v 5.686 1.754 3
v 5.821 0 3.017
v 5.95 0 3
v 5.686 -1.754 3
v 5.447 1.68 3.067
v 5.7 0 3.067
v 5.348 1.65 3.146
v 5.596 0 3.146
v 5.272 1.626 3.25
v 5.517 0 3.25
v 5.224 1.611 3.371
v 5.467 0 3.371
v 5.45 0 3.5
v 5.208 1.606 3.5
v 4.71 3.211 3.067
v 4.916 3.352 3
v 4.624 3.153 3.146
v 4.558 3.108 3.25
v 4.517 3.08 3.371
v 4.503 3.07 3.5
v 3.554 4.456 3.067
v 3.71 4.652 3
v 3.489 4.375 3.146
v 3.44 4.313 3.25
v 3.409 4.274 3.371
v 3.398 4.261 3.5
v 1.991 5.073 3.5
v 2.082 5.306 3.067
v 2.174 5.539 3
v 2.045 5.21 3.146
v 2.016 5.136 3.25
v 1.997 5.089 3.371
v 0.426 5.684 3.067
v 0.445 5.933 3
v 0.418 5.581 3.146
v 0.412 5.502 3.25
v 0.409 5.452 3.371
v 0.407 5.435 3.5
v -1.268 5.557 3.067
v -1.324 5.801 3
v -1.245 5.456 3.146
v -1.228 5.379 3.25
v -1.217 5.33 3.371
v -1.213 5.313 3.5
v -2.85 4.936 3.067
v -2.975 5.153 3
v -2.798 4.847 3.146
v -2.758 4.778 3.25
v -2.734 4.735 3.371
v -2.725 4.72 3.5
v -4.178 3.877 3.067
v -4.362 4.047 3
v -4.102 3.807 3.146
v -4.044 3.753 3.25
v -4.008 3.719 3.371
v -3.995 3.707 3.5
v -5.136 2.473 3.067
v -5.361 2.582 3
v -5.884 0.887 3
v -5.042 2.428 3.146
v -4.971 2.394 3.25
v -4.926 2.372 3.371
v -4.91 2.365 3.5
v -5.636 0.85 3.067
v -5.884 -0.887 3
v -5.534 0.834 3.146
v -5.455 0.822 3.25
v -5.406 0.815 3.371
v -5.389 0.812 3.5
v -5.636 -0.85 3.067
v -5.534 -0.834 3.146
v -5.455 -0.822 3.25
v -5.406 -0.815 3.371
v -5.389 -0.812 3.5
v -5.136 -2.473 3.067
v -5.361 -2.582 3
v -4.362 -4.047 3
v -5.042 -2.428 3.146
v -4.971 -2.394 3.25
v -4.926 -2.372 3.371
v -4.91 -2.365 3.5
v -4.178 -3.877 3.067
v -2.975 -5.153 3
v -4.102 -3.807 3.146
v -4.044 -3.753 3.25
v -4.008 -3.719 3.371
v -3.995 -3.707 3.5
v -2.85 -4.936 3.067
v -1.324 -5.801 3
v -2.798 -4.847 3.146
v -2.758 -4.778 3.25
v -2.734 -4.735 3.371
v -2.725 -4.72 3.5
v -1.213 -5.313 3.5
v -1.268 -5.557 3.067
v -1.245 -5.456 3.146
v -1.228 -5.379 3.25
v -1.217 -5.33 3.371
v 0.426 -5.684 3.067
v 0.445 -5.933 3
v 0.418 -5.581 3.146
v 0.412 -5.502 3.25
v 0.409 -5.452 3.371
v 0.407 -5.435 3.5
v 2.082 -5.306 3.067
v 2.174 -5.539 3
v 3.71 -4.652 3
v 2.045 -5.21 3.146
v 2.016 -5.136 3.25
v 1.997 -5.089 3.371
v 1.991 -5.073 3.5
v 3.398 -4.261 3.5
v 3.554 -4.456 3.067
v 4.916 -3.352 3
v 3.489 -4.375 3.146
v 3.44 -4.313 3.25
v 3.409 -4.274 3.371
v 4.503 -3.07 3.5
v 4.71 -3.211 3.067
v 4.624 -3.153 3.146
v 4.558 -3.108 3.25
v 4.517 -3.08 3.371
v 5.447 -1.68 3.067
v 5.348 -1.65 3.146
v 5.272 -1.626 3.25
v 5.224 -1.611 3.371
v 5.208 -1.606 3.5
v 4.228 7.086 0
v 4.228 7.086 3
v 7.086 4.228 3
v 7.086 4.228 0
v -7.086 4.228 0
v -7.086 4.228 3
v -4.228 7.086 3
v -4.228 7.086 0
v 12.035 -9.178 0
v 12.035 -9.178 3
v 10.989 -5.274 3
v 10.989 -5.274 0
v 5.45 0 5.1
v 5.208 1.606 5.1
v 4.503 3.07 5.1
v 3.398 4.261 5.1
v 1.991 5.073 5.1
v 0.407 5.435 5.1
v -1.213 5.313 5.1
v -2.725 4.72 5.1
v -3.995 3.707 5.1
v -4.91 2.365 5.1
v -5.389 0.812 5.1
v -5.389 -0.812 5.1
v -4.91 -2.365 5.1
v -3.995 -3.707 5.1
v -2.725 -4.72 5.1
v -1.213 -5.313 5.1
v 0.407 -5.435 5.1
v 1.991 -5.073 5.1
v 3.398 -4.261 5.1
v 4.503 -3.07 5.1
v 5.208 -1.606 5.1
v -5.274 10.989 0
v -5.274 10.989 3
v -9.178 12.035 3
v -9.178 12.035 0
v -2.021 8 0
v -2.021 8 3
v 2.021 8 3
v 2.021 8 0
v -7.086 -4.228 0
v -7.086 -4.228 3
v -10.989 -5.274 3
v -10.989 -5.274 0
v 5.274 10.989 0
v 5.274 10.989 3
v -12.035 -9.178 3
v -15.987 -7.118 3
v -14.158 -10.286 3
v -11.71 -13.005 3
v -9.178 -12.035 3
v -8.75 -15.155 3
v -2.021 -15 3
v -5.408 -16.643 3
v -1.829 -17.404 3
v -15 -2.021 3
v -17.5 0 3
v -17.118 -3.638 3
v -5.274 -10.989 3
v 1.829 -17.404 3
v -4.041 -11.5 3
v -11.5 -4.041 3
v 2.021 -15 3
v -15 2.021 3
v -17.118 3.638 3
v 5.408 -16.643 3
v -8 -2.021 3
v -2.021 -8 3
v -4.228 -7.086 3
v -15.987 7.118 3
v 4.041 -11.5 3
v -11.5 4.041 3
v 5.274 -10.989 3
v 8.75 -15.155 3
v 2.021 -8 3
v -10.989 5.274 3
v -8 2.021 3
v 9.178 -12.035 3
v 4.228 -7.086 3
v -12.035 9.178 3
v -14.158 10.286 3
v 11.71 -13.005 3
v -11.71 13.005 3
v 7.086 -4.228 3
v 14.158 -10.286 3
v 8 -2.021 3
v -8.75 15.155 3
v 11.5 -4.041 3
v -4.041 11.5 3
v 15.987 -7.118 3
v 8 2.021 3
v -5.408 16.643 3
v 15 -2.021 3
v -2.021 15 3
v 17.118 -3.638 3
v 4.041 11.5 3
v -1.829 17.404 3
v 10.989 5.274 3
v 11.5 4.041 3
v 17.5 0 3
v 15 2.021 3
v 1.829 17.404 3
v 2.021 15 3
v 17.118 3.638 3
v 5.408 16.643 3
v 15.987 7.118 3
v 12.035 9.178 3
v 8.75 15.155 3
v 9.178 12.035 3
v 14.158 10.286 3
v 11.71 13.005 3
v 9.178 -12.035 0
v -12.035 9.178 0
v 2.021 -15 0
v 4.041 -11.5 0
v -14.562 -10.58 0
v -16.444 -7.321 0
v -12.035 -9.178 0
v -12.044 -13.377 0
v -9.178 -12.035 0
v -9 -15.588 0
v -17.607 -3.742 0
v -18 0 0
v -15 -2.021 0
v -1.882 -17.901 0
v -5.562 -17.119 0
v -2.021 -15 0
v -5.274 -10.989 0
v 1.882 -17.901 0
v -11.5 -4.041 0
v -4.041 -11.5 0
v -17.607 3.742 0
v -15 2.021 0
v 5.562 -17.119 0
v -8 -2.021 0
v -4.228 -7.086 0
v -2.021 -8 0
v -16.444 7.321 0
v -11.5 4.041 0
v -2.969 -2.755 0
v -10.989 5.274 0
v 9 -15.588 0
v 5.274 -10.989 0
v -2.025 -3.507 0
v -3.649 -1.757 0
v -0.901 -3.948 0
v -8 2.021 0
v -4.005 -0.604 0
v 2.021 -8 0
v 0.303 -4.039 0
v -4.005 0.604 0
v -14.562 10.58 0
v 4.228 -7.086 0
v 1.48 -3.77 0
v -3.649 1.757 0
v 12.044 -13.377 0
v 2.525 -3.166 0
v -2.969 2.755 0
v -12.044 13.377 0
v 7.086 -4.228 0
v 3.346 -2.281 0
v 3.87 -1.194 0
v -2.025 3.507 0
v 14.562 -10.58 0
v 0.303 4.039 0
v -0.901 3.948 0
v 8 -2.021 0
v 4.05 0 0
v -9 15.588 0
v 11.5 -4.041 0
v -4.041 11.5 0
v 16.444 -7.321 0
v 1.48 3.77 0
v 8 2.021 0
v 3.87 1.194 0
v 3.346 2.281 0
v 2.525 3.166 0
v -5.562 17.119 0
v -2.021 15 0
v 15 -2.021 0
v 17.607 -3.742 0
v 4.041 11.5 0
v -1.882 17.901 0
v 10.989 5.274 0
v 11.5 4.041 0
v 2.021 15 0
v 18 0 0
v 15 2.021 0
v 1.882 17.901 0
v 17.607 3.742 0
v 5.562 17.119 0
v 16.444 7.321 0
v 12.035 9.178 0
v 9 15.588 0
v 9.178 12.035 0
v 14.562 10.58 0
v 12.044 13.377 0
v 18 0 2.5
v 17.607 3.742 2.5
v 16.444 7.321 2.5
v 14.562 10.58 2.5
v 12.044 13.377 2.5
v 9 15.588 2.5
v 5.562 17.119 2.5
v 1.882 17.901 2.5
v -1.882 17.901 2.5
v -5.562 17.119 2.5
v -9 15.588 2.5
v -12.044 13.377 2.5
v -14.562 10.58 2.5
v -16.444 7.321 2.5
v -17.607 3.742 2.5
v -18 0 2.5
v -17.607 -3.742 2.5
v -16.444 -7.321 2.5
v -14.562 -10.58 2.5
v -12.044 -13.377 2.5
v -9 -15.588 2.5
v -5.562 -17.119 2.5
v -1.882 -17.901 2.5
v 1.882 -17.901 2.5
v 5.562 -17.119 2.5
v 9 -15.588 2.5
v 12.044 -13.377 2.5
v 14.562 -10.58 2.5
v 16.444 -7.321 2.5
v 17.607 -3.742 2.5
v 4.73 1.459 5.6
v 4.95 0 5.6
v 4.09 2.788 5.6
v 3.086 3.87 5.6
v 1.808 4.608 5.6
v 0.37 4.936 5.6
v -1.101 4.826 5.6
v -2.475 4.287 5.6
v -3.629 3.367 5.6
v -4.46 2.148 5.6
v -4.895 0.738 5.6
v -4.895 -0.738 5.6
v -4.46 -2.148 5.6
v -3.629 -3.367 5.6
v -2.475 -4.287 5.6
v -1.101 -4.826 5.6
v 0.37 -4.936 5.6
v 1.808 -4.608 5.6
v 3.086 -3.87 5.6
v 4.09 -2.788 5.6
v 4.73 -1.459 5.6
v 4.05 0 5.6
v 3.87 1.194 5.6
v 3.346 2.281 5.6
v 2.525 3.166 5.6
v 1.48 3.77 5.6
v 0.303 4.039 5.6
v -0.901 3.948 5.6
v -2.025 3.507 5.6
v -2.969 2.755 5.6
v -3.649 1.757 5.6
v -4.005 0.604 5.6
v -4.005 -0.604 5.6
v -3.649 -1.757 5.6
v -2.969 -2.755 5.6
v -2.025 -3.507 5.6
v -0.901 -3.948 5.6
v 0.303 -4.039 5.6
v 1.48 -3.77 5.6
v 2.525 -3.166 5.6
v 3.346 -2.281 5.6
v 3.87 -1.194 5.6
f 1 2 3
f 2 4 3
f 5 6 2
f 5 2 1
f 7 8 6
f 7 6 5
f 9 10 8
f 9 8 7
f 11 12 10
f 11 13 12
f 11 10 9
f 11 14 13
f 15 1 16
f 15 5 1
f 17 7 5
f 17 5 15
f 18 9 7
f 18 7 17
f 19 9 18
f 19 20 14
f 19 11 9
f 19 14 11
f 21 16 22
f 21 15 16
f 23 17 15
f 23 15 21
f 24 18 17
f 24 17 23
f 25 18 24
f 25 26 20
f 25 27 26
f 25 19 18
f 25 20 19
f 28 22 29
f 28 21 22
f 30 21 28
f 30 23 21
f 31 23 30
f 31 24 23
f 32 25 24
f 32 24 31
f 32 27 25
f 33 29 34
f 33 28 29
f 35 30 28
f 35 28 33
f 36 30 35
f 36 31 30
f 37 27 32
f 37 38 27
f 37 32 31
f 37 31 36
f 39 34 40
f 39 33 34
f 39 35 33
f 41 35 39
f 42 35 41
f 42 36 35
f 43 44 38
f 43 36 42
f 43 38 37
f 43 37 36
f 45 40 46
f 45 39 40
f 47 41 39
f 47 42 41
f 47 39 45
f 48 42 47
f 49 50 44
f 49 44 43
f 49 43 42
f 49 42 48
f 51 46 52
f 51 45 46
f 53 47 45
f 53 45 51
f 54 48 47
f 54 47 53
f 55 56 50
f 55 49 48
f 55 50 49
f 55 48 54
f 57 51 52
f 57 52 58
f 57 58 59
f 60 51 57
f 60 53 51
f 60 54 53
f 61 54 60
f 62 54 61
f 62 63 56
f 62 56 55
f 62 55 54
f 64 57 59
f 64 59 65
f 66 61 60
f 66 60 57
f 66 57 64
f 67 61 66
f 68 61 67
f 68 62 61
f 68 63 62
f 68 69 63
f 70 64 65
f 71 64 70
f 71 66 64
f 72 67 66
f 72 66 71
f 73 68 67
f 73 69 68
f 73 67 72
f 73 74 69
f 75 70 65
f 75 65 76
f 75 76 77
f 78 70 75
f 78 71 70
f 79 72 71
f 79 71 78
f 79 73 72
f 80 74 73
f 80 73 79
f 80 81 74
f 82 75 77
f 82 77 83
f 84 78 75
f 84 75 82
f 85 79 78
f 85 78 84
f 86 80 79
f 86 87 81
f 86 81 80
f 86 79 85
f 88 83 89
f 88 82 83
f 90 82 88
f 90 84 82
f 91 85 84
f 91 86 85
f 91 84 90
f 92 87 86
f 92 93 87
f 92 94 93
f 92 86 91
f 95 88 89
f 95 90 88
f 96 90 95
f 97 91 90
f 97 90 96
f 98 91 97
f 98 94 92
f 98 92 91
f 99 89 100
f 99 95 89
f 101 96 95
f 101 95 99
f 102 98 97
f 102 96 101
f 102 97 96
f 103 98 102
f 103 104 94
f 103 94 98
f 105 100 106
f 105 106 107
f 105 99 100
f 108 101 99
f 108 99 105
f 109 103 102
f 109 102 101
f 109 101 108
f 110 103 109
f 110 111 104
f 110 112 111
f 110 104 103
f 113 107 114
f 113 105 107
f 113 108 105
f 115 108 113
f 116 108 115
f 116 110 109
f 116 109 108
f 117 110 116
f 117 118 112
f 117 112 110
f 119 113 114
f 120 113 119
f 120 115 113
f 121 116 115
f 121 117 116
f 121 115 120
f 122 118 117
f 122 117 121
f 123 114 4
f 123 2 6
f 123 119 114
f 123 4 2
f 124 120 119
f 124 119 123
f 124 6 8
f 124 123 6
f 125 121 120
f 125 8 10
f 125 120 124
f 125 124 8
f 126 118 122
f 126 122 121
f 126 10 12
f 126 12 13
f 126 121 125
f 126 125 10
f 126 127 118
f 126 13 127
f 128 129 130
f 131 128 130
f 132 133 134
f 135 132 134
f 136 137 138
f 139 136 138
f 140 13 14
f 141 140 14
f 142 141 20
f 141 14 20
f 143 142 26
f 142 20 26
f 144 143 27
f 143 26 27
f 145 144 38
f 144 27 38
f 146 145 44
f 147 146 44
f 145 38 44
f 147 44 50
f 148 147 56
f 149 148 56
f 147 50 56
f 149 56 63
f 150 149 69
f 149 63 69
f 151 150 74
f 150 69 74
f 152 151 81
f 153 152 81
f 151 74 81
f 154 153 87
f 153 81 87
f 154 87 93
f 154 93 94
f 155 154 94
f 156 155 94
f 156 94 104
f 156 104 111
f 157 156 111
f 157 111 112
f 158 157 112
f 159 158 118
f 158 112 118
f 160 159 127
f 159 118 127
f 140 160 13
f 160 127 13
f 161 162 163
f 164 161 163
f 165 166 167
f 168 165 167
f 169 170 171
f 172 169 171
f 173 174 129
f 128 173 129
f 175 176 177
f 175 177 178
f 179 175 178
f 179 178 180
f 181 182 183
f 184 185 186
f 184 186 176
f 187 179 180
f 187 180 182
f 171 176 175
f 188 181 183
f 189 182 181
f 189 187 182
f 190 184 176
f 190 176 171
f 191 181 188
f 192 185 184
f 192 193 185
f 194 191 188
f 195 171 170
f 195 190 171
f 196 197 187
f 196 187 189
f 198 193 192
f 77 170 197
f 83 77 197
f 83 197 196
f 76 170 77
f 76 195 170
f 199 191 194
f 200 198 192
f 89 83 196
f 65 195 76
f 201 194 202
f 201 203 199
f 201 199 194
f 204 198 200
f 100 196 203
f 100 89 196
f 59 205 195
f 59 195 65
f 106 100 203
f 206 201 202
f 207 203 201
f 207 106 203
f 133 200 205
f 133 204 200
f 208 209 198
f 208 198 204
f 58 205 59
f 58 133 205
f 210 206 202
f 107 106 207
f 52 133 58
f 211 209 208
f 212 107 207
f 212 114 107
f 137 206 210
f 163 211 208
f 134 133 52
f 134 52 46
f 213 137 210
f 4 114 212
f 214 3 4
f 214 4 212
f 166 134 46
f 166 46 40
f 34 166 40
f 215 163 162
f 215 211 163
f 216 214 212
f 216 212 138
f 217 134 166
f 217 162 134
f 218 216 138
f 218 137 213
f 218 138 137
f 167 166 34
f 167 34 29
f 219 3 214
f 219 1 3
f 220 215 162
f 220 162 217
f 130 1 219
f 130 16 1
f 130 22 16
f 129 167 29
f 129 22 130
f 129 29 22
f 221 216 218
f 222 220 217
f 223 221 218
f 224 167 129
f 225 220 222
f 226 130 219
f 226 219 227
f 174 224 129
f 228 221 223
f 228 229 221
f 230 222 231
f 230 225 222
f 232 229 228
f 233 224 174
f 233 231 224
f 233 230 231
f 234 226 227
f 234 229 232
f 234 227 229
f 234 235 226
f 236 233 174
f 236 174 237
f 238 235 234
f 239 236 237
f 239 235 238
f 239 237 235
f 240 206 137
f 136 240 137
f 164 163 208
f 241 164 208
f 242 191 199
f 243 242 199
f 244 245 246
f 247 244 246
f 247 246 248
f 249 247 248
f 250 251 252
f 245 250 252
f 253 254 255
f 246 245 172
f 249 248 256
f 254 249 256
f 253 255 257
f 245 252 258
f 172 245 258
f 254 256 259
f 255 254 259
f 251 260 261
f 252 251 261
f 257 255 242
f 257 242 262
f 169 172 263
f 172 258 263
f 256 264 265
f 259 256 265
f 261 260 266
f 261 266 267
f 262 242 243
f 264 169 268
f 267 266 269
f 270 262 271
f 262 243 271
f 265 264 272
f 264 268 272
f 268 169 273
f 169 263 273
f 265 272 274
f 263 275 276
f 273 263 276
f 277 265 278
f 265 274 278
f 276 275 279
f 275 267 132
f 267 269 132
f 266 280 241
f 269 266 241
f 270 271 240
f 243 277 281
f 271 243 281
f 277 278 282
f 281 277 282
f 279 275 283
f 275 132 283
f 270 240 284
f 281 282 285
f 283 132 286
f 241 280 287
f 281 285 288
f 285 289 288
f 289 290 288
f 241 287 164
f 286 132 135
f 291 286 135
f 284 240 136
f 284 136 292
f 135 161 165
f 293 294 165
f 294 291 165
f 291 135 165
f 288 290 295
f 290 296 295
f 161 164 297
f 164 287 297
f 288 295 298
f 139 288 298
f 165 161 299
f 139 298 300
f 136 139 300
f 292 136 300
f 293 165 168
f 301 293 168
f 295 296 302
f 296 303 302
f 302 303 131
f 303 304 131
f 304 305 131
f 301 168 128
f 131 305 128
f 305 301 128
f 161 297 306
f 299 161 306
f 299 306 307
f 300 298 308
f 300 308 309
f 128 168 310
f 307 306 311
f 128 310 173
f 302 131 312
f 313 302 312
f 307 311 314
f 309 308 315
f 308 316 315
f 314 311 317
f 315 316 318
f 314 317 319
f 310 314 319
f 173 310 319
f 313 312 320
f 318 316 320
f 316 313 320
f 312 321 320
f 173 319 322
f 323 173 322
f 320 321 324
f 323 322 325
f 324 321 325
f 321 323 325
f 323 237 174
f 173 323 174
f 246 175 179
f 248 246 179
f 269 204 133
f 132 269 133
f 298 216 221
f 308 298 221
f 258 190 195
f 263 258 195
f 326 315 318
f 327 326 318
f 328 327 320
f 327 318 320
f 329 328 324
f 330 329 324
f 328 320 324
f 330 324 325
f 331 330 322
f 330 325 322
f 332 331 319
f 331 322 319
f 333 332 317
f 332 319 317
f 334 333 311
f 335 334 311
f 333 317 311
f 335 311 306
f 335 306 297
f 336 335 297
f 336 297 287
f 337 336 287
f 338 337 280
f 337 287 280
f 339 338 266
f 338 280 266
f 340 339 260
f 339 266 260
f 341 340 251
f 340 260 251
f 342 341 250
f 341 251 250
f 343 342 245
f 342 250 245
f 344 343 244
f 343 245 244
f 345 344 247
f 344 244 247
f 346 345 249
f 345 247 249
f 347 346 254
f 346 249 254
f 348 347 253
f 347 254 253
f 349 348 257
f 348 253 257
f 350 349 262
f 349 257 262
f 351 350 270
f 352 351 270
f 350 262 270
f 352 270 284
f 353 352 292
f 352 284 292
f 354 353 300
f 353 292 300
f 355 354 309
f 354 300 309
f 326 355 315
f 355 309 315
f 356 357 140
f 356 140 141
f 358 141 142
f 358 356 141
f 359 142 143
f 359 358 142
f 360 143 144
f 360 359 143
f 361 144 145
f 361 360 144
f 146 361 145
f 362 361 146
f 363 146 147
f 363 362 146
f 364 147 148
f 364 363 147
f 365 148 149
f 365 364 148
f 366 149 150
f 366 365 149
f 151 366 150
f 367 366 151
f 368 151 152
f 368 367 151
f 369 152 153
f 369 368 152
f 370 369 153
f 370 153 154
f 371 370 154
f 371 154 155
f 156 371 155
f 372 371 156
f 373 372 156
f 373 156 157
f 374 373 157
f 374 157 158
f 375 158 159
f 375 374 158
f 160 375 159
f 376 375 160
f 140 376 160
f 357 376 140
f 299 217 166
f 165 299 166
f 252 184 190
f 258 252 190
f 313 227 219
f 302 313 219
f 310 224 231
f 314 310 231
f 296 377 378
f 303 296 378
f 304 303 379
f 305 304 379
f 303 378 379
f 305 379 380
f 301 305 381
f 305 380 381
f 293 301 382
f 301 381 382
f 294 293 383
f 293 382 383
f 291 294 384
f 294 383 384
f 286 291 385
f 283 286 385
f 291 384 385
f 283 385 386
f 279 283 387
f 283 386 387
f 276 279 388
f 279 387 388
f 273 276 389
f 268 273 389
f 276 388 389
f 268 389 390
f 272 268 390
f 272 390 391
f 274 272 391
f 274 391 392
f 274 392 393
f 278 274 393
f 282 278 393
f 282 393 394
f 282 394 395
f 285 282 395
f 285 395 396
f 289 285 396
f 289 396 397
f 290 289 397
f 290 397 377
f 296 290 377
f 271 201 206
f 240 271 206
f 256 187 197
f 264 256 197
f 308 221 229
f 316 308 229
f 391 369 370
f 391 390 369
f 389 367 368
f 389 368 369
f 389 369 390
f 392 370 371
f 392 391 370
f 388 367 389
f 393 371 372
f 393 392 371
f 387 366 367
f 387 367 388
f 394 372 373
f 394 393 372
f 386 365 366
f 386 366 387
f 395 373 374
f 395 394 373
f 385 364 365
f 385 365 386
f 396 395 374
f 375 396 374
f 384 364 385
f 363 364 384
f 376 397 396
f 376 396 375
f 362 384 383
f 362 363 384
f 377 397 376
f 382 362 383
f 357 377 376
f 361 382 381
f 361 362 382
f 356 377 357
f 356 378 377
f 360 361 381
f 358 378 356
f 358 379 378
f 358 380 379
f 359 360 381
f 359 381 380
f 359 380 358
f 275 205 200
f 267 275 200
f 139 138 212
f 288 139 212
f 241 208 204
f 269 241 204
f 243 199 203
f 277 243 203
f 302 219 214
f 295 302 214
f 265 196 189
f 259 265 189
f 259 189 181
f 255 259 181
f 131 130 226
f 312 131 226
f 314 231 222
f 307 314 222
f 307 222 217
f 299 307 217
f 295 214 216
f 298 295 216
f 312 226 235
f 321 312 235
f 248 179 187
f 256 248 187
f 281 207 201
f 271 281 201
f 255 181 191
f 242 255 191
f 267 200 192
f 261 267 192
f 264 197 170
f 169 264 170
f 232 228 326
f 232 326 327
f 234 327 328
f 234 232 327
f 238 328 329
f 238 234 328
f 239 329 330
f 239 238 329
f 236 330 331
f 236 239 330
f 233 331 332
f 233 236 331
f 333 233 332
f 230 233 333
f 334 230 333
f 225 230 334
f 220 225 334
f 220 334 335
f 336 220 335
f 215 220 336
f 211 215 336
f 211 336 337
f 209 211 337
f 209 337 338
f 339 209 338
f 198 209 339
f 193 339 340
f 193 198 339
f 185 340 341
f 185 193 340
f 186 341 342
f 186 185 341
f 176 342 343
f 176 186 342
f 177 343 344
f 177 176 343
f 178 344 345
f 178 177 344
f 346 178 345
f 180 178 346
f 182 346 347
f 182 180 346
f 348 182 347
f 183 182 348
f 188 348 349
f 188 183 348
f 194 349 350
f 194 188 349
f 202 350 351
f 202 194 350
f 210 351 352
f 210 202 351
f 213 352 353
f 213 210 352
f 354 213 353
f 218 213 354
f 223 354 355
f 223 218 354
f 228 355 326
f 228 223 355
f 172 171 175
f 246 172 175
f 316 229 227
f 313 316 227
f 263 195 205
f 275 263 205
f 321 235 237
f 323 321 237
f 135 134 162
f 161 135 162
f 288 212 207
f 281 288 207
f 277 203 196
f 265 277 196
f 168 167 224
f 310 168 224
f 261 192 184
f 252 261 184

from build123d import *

# Parameters (mm, degrees)
CROQUIS1_R              = 18
SALIENTE_EXTRUIR1_DEPTH = 3
CROQUIS2_R              = 5.45
SALIENTE_EXTRUIR2_DEPTH = 2.6
CHAFL_N1_SIZE           = 0.5
REDONDEO1_R             = 0.5
CORTAR_EXTRUIR1_DEPTH   = 3
MATRIZC1_COUNT          = 8
CROQUIS4_R              = 4.05
CORTAR_EXTRUIR2_DEPTH   = 27.064535292


with BuildPart() as part:
    # Croquis1 → Saliente-Extruir1 (new body)
    with BuildSketch(Plane(origin=(0, 0, 0), x_dir=(0, 1, 0), z_dir=(0, 0, 1))):
        with Locations(Location((0, 0, 0), (0, 0, 270))):
            Circle(CROQUIS1_R)
    extrude(amount=SALIENTE_EXTRUIR1_DEPTH)

    # Croquis2 → Saliente-Extruir2 (add)
    with BuildSketch(Plane.XY.offset(3)):
        Circle(CROQUIS2_R)
    extrude(amount=SALIENTE_EXTRUIR2_DEPTH)

    # Chaflán1
    chafl_n1_edges = [part.edges().sort_by_distance(p)[0] for p in [
        (-18, 0, 3),
        (-5.45, 0, 5.6),
    ]]
    chamfer(chafl_n1_edges, length=CHAFL_N1_SIZE)

    # Redondeo1
    redondeo1_edges = [part.edges().sort_by_distance(p)[0] for p in [
        (-5.45, 0, 3),
    ]]
    fillet(redondeo1_edges, radius=REDONDEO1_R)

    # Croquis3 → Cortar-Extruir1 (cut)
    with BuildSketch(Plane.XY.offset(3)):
        Polygon((-4.041451884, 11.5), (-2.020725942, 8), (2.020725942, 8), (4.041451884, 11.5), (2.020725942, 15), (-2.020725942, 15), align=None)
    cortar_extruir1 = extrude(amount=-CORTAR_EXTRUIR1_DEPTH, mode=Mode.SUBTRACT)

    # MatrizC1: Cortar-Extruir1 ×8 about axis
    matrizc1_axis = Axis((0, 0, 0), (0, 0, 1))
    for i in range(1, MATRIZC1_COUNT):
        add(cortar_extruir1.rotate(matrizc1_axis, i * 360 / MATRIZC1_COUNT), mode=Mode.SUBTRACT)

    # Croquis4 → Cortar-Extruir2 (cut, through all)
    with BuildSketch(Plane.XY.offset(5.6)):
        Circle(CROQUIS4_R)
    extrude(amount=-CORTAR_EXTRUIR2_DEPTH, mode=Mode.SUBTRACT)


solid = part.part
